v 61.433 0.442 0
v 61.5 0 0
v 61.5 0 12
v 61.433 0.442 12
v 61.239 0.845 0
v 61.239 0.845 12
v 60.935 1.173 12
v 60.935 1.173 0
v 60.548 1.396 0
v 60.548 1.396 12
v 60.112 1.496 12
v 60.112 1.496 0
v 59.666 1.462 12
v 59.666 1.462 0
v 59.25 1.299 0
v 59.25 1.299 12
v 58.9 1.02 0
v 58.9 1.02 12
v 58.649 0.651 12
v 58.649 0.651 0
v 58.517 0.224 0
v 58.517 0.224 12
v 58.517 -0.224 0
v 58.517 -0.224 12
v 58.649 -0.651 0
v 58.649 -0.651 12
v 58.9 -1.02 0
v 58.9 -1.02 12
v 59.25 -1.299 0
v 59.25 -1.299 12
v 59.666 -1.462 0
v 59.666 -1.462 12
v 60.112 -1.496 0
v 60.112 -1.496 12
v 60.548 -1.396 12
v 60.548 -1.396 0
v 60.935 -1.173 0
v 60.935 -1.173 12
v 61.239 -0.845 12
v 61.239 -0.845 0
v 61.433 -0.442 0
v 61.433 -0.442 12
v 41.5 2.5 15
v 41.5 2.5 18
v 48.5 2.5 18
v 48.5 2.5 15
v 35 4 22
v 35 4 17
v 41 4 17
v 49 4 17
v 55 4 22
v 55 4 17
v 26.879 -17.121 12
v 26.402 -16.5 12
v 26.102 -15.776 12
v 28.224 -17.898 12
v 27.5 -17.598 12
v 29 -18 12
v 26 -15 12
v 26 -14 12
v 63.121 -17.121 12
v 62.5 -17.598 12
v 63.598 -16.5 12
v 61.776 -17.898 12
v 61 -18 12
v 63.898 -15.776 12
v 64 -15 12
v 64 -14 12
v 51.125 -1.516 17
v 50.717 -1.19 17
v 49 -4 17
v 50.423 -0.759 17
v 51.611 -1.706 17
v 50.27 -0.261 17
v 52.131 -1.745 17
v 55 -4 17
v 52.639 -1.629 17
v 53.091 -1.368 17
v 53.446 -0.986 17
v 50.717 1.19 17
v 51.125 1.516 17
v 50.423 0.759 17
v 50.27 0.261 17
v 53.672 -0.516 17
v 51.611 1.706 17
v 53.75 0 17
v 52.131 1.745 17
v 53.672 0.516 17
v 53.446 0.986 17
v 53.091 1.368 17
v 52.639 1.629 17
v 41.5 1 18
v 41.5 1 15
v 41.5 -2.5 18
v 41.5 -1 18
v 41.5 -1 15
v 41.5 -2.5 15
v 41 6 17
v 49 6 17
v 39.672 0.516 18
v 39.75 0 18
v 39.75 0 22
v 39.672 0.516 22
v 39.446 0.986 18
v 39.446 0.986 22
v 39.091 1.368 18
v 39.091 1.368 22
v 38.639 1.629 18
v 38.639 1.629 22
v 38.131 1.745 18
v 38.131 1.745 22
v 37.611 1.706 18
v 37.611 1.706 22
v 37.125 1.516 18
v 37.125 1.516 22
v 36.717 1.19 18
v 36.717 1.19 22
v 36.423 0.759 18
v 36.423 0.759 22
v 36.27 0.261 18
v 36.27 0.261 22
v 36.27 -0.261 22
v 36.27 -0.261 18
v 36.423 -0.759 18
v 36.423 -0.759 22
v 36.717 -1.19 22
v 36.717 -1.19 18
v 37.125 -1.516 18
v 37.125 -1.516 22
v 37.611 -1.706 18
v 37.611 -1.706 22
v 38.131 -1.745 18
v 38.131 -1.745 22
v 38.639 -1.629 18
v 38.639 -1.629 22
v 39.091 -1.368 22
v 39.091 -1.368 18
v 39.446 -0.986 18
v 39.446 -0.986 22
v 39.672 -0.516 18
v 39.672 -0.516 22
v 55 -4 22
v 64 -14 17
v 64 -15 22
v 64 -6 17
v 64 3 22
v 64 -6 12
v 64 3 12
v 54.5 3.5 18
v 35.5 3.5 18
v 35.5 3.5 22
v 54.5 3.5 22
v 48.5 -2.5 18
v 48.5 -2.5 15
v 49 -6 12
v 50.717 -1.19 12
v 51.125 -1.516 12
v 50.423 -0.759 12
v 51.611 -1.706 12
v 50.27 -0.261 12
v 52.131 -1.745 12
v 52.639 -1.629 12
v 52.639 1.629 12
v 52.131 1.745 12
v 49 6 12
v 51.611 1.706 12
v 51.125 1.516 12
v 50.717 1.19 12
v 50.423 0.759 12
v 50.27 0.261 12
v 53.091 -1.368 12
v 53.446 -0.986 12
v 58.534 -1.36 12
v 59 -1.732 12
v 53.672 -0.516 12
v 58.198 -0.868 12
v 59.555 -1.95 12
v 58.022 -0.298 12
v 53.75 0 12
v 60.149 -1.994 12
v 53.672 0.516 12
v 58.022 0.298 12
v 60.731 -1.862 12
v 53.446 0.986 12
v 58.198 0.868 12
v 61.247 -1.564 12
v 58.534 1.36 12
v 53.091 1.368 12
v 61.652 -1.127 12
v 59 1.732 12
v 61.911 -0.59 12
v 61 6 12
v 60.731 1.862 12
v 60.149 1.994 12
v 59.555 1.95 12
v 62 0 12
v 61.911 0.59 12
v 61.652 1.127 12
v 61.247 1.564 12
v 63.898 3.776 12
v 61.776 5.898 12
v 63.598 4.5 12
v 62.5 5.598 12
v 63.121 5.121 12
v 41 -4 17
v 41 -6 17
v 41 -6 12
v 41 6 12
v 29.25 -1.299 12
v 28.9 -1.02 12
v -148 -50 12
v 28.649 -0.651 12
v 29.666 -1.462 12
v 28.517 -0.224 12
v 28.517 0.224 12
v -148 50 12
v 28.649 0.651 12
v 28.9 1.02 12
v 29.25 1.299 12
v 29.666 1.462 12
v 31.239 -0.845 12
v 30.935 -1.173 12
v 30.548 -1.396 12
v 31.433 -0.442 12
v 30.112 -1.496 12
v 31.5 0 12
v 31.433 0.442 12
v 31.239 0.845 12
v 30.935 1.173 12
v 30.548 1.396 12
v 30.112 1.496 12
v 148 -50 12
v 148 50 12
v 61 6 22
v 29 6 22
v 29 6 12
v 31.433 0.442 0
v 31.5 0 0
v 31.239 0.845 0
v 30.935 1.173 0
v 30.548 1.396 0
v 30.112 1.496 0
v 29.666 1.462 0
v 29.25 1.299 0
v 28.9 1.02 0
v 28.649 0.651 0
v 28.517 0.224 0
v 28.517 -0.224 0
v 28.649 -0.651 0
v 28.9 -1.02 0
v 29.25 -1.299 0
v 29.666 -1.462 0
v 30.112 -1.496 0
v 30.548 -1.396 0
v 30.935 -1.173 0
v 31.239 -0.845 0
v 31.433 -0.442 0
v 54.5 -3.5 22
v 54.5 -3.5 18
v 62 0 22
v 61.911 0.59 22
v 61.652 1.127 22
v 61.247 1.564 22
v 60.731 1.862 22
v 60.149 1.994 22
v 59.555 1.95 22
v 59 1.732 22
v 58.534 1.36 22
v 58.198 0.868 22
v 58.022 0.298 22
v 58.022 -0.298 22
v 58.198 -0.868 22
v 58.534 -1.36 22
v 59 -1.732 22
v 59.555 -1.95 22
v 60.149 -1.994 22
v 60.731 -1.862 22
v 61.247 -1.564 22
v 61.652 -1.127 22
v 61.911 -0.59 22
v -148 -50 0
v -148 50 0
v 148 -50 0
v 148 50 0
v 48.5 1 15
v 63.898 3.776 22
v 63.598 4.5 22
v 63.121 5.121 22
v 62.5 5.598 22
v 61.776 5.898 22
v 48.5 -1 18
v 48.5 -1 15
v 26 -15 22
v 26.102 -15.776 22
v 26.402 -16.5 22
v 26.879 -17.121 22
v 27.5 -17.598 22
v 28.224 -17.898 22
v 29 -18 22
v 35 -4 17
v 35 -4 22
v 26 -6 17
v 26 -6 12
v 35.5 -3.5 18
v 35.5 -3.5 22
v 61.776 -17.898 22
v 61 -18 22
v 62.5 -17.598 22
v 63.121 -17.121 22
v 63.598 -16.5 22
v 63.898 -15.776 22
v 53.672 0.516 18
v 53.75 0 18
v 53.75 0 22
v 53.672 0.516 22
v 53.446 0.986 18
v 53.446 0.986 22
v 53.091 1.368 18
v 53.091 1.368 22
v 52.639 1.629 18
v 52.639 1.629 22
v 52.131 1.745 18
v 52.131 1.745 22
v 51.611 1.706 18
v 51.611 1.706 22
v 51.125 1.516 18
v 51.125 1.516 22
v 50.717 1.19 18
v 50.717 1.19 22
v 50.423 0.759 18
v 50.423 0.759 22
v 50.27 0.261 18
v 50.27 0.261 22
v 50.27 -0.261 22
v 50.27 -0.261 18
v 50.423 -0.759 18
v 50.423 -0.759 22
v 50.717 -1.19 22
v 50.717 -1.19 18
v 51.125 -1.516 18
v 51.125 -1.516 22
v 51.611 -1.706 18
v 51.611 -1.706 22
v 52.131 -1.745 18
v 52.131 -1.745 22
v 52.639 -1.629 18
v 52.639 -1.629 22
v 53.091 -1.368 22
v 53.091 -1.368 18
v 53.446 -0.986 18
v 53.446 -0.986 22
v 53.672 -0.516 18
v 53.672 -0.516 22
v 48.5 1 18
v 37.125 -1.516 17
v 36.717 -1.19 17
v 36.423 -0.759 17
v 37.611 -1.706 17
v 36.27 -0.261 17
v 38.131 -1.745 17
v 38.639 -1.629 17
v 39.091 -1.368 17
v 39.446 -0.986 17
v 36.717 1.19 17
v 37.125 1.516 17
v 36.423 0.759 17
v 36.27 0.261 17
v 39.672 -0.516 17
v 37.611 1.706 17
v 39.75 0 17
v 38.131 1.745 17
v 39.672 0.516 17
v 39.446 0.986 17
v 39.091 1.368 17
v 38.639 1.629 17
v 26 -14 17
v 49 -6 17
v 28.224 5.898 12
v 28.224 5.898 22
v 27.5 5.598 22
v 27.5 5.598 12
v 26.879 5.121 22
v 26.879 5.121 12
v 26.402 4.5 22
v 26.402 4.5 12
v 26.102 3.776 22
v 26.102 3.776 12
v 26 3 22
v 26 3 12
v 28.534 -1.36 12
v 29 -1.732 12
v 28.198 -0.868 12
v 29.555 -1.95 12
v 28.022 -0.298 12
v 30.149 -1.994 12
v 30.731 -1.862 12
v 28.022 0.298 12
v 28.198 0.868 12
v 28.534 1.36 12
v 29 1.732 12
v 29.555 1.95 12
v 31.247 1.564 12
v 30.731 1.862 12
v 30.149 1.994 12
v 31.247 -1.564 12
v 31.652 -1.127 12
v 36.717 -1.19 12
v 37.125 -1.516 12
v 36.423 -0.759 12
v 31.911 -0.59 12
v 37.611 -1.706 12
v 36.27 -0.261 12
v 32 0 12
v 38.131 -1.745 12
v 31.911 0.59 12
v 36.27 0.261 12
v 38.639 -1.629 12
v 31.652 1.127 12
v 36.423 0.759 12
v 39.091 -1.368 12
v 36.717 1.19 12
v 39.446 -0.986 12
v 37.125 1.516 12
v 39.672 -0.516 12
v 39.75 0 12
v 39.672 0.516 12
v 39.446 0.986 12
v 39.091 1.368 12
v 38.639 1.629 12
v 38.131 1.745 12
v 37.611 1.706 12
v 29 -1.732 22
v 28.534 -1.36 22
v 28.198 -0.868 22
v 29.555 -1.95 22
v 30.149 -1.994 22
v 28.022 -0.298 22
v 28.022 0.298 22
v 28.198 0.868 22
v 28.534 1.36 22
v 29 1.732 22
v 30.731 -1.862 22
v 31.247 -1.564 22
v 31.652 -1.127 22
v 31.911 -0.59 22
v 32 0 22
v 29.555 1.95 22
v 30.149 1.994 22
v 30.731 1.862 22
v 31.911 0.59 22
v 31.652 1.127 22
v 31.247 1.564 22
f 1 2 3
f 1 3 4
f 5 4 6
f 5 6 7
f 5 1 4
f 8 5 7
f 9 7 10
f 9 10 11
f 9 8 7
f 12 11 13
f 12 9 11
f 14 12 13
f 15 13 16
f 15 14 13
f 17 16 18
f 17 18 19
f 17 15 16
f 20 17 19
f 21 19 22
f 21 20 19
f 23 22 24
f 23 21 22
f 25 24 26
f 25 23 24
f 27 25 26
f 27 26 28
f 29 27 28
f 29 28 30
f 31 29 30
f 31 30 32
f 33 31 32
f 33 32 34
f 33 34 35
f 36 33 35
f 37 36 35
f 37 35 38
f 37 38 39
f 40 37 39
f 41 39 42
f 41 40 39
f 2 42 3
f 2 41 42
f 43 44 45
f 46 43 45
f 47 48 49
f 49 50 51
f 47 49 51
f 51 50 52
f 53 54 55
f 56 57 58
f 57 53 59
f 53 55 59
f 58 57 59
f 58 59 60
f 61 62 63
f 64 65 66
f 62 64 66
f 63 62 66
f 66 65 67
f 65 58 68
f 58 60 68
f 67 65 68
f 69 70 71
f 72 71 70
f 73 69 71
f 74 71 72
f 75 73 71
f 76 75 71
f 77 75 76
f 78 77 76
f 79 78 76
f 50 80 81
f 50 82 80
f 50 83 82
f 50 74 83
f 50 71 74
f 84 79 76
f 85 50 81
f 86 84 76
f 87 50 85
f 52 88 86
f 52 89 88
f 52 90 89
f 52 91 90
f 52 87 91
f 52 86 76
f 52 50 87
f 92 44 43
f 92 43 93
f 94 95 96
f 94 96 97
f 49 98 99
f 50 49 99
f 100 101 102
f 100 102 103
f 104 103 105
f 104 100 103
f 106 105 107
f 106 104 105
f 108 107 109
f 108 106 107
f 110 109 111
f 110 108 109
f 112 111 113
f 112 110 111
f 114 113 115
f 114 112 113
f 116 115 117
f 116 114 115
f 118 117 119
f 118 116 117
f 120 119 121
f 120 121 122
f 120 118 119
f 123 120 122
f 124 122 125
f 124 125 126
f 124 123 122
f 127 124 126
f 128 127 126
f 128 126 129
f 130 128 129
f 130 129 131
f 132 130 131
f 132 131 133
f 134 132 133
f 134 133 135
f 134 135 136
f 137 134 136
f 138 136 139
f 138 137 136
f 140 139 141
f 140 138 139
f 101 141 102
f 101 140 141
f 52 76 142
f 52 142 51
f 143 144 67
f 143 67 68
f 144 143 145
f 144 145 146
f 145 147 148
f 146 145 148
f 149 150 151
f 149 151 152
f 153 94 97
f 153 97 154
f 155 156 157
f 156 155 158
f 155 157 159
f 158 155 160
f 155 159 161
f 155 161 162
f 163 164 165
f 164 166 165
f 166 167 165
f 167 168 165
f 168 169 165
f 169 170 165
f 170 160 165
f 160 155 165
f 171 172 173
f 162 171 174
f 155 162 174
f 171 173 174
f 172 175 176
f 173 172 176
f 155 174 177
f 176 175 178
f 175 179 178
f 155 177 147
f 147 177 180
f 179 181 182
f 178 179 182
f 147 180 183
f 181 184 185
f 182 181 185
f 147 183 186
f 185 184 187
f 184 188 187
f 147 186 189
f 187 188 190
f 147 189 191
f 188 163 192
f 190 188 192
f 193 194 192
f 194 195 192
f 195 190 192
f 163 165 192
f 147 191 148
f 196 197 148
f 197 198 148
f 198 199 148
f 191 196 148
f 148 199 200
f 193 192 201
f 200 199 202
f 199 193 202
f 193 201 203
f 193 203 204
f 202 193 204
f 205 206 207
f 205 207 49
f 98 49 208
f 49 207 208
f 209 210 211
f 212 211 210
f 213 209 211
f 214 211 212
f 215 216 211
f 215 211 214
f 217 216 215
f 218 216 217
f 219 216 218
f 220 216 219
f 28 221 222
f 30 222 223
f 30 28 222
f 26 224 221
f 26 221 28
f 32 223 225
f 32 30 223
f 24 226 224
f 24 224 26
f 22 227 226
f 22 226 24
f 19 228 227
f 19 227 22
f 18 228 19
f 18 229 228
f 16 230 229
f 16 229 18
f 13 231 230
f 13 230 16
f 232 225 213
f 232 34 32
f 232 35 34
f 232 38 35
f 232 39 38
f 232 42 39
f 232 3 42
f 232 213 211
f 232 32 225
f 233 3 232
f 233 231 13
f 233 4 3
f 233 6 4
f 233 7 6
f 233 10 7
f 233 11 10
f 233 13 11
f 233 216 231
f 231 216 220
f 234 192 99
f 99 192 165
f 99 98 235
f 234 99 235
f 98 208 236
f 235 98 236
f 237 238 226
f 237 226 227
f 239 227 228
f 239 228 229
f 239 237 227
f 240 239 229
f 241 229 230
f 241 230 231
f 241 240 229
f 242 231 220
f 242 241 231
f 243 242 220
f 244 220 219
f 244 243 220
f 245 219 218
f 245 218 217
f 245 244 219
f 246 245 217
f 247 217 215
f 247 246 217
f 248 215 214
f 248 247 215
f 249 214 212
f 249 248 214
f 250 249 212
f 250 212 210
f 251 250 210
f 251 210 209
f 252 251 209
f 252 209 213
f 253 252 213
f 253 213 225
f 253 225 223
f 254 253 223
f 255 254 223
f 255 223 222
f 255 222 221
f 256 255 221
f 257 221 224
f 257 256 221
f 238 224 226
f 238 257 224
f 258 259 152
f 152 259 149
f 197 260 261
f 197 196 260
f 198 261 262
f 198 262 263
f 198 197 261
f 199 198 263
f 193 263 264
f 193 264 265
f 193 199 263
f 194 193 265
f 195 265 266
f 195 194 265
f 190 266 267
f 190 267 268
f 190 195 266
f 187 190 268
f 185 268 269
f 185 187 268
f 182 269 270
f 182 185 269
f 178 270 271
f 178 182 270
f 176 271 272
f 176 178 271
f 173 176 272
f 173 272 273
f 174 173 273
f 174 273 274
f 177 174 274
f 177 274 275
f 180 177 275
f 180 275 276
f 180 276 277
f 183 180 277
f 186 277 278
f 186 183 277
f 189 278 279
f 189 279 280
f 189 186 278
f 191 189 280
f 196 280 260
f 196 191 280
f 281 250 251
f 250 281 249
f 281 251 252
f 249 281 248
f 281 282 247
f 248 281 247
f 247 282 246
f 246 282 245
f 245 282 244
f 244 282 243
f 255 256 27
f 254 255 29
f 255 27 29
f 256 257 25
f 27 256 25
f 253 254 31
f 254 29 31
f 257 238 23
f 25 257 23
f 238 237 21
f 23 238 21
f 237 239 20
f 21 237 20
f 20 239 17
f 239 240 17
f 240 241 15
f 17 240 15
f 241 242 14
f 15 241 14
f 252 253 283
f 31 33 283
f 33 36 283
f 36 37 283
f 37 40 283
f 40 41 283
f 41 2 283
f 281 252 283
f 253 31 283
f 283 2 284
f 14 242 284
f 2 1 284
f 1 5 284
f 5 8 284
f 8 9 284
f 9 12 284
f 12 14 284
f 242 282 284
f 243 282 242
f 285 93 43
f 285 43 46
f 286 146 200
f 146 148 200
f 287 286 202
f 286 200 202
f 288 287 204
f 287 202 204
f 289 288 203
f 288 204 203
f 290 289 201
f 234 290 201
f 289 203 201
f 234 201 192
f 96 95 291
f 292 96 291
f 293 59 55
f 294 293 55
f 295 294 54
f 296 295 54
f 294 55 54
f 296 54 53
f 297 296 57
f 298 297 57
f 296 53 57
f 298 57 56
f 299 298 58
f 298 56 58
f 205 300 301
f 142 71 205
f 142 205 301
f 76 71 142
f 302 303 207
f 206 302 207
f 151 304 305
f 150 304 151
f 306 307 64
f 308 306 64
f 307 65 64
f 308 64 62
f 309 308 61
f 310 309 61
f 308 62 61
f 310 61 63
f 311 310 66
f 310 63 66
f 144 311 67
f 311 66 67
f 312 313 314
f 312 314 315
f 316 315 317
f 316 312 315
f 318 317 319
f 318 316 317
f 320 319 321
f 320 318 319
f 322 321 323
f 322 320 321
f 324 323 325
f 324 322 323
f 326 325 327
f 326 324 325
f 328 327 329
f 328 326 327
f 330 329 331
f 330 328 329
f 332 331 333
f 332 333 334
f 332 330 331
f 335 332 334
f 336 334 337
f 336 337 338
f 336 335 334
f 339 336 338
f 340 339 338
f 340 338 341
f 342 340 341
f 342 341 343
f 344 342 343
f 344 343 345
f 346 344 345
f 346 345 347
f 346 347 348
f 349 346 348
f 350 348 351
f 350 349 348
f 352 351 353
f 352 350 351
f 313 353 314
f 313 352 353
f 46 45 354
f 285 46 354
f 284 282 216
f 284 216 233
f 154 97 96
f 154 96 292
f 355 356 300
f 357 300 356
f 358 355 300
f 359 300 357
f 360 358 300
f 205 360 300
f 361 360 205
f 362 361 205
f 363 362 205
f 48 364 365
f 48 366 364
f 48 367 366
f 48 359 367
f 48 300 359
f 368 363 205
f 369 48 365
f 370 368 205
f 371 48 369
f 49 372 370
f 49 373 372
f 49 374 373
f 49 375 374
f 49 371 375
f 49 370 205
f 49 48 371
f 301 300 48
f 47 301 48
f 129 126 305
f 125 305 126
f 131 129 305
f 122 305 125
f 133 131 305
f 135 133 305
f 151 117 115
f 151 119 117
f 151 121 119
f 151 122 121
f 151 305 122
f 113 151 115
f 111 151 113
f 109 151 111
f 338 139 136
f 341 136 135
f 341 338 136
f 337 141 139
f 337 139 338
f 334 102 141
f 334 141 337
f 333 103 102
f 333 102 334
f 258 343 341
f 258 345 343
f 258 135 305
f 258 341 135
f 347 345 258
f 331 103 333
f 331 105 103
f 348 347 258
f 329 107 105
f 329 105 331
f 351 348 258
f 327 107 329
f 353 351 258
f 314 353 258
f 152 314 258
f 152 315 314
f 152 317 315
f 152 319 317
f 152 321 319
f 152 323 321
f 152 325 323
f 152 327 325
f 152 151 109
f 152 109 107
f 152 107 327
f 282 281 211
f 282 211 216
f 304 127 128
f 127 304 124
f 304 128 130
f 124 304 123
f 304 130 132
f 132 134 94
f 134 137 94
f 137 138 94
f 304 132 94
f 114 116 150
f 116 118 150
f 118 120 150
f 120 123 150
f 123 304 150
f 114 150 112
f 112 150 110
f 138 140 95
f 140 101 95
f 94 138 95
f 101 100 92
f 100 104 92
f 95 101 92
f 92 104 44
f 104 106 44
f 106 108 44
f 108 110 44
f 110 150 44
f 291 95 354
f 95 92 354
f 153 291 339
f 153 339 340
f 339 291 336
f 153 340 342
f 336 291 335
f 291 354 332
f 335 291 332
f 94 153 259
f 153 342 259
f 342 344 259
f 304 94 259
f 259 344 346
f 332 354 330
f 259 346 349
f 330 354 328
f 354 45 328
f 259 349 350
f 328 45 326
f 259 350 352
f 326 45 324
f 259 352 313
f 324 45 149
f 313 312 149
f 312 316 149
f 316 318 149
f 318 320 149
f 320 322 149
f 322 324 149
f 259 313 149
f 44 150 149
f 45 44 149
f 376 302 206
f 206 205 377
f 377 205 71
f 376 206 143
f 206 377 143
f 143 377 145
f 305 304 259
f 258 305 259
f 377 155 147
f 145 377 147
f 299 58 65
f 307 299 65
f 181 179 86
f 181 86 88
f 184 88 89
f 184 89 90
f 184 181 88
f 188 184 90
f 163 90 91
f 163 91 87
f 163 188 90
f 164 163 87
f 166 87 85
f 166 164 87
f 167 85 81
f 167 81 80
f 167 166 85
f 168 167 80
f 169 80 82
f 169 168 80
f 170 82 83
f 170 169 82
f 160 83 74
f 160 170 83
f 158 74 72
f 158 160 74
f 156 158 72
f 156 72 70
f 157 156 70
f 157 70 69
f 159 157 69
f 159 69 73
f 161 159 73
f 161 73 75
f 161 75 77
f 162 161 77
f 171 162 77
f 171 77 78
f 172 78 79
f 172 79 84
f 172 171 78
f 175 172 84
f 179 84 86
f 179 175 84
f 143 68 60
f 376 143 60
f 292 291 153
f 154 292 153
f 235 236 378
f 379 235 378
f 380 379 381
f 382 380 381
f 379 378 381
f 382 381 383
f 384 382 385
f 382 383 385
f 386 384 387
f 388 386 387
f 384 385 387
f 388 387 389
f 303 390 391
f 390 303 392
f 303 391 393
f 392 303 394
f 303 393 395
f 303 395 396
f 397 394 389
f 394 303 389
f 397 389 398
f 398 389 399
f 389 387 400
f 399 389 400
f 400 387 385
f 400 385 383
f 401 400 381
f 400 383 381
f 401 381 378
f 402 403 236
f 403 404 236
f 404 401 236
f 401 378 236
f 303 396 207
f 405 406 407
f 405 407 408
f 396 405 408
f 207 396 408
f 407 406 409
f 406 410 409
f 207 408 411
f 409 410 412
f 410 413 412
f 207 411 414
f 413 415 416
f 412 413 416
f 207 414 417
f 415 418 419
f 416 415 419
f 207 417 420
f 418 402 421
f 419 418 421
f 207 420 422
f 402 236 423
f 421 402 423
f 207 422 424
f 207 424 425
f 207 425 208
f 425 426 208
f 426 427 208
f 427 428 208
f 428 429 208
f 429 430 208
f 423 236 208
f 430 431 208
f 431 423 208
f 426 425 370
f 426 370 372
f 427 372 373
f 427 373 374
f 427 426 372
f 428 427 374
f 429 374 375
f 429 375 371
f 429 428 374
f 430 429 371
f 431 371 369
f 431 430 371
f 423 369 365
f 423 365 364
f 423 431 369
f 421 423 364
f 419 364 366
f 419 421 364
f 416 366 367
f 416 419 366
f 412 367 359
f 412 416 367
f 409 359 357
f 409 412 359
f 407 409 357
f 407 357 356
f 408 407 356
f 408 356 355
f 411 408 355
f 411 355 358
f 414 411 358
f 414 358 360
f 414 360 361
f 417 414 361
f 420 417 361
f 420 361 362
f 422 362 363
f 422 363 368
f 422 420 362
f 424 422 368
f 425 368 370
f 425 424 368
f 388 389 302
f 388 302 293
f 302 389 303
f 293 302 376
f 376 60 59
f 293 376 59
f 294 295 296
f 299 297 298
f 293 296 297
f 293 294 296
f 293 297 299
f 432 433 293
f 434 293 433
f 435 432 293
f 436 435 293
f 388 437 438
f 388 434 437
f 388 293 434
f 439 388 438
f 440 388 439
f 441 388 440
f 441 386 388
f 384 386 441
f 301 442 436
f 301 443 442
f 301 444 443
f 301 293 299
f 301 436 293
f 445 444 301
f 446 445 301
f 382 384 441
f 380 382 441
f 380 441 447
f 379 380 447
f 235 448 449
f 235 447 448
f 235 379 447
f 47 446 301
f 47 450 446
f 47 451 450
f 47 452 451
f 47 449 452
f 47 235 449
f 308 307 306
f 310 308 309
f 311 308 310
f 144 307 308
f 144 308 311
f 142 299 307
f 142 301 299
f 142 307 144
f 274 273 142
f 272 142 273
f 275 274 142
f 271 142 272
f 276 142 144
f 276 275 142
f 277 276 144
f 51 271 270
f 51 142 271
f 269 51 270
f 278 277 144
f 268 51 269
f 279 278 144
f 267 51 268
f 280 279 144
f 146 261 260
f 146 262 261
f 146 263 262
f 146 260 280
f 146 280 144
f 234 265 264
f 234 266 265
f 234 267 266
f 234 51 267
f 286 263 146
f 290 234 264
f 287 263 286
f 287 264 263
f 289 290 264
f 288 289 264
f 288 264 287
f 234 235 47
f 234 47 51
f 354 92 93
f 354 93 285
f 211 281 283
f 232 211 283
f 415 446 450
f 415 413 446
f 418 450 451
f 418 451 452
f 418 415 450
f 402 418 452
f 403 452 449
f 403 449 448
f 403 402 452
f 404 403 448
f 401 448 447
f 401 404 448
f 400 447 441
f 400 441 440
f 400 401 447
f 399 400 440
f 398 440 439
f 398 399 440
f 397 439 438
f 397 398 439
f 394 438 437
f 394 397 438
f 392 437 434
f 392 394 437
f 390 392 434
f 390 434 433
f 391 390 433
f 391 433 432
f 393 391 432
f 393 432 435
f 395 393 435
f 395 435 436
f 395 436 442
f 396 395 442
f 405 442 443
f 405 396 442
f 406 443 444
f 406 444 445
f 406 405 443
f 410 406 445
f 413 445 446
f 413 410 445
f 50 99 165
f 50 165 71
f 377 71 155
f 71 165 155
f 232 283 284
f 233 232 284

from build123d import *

# Parameters (mm, degrees)
F0_W     = 296
F0_H     = 100
F0_R     = 1.5
F1_DEPTH = 12
F2_R     = 2
F2_R_2   = 1.75
F3_DEPTH = 5
F4_R     = 2
F4_W     = 20
F4_H     = 8
F5_DEPTH = 5
F7_START = 1
F6_W     = 19
F6_H     = 7
F6_R     = 1.75
F7_DEPTH = 4
F8_W     = 7
F8_H     = 1.5
F9_DEPTH = 3


with BuildPart() as f1:
    # F0 (on Top) → F1 (new body)
    with BuildSketch(Plane.XY):
        Rectangle(F0_W, F0_H)
        with Locations((30, 0)):
            Circle(F0_R, mode=Mode.SUBTRACT)
        with Locations((60, 0)):
            Circle(F0_R, mode=Mode.SUBTRACT)
    extrude(amount=F1_DEPTH)


with BuildPart() as f3:
    # F2 (on face) → F3 (new body)
    with BuildSketch(Plane.XY.offset(12)):
        with BuildLine():
            Line((41, 6), (29, 6))
            ThreePointArc((29, 6), (26.8786796564, 5.1213203436), (26, 3))
            Line((26, 3), (26, -6))
            Line((26, -6), (41, -6))
            Line((41, -6), (41, 6))
        make_face()
        with Locations((30, 0)):
            Circle(F2_R, mode=Mode.SUBTRACT)
        with Locations((38, 0)):
            Circle(F2_R_2, mode=Mode.SUBTRACT)
    extrude(amount=F3_DEPTH)



with BuildPart() as f3b:
    # F2 (on face) → F3, piece 2 (new body)
    with BuildSketch(Plane.XY.offset(12)):
        with BuildLine():
            ThreePointArc((26, -15), (26.8786796564, -17.1213203436), (29, -18))
            Line((29, -18), (61, -18))
            ThreePointArc((61, -18), (63.1213203436, -17.1213203436), (64, -15))
            Line((64, -15), (64, -14))
            Line((64, -14), (26, -14))
            Line((26, -14), (26, -15))
        make_face()
    extrude(amount=F3_DEPTH)


with BuildPart() as f3c:
    # F2 (on face) → F3, piece 3 (new body)
    with BuildSketch(Plane.XY.offset(12)):
        with BuildLine():
            Line((64, -6), (64, 3))
            ThreePointArc((64, 3), (63.1213203436, 5.1213203436), (61, 6))
            Line((61, 6), (49, 6))
            Line((49, 6), (49, -6))
            Line((49, -6), (64, -6))
        make_face()
        with Locations((52, 0)):
            Circle(F2_R_2, mode=Mode.SUBTRACT)
        with Locations((60, 0)):
            Circle(F2_R, mode=Mode.SUBTRACT)
    extrude(amount=F3_DEPTH)


with BuildPart() as f3_1:
    add(f3.part)

    add(f3b.part)  # F5 merges F3b

    add(f3c.part)  # F5 merges F3c
    # F4 (on face) → F5 (join)
    with BuildSketch(Plane.XY.offset(17)):
        with BuildLine():
            Line((29, -18), (61, -18))
            ThreePointArc((61, -18), (63.1213203436, -17.1213203436), (64, -15))
            Line((64, -15), (64, 3))
            ThreePointArc((64, 3), (63.1213203436, 5.1213203436), (61, 6))
            Line((61, 6), (29, 6))
            ThreePointArc((29, 6), (26.8786796564, 5.1213203436), (26, 3))
            Line((26, 3), (26, -15))
            ThreePointArc((26, -15), (26.8786796564, -17.1213203436), (29, -18))
        make_face()
        with Locations((30, 0)):
            Circle(F4_R, mode=Mode.SUBTRACT)
        with Locations((45, 0)):
            Rectangle(F4_W, F4_H, mode=Mode.SUBTRACT)
        with Locations((60, 0)):
            Circle(F4_R, mode=Mode.SUBTRACT)
    extrude(amount=F5_DEPTH)


with BuildPart() as f7:
    # F6 (on face) → F7 (new body)
    with BuildSketch(Plane.XY.offset(17).offset(F7_START)):
        with Locations((45, 0)):
            Rectangle(F6_W, F6_H)
        with Locations((38, 0)):
            Circle(F6_R, mode=Mode.SUBTRACT)
        with Locations((52, 0)):
            Circle(F6_R, mode=Mode.SUBTRACT)
    extrude(amount=F7_DEPTH)

    # F8 (on face) → F9 (join)
    with BuildSketch(Plane(origin=(0, 0, 18), x_dir=(1, 0, 0), z_dir=(0, 0, -1))):
        with Locations((45, 1.75)):
            Rectangle(F8_W, F8_H)
        with Locations((45, -1.75)):
            Rectangle(F8_W, F8_H)
    extrude(amount=F9_DEPTH)


solid = Compound([f1.part, f3_1.part, f7.part])
